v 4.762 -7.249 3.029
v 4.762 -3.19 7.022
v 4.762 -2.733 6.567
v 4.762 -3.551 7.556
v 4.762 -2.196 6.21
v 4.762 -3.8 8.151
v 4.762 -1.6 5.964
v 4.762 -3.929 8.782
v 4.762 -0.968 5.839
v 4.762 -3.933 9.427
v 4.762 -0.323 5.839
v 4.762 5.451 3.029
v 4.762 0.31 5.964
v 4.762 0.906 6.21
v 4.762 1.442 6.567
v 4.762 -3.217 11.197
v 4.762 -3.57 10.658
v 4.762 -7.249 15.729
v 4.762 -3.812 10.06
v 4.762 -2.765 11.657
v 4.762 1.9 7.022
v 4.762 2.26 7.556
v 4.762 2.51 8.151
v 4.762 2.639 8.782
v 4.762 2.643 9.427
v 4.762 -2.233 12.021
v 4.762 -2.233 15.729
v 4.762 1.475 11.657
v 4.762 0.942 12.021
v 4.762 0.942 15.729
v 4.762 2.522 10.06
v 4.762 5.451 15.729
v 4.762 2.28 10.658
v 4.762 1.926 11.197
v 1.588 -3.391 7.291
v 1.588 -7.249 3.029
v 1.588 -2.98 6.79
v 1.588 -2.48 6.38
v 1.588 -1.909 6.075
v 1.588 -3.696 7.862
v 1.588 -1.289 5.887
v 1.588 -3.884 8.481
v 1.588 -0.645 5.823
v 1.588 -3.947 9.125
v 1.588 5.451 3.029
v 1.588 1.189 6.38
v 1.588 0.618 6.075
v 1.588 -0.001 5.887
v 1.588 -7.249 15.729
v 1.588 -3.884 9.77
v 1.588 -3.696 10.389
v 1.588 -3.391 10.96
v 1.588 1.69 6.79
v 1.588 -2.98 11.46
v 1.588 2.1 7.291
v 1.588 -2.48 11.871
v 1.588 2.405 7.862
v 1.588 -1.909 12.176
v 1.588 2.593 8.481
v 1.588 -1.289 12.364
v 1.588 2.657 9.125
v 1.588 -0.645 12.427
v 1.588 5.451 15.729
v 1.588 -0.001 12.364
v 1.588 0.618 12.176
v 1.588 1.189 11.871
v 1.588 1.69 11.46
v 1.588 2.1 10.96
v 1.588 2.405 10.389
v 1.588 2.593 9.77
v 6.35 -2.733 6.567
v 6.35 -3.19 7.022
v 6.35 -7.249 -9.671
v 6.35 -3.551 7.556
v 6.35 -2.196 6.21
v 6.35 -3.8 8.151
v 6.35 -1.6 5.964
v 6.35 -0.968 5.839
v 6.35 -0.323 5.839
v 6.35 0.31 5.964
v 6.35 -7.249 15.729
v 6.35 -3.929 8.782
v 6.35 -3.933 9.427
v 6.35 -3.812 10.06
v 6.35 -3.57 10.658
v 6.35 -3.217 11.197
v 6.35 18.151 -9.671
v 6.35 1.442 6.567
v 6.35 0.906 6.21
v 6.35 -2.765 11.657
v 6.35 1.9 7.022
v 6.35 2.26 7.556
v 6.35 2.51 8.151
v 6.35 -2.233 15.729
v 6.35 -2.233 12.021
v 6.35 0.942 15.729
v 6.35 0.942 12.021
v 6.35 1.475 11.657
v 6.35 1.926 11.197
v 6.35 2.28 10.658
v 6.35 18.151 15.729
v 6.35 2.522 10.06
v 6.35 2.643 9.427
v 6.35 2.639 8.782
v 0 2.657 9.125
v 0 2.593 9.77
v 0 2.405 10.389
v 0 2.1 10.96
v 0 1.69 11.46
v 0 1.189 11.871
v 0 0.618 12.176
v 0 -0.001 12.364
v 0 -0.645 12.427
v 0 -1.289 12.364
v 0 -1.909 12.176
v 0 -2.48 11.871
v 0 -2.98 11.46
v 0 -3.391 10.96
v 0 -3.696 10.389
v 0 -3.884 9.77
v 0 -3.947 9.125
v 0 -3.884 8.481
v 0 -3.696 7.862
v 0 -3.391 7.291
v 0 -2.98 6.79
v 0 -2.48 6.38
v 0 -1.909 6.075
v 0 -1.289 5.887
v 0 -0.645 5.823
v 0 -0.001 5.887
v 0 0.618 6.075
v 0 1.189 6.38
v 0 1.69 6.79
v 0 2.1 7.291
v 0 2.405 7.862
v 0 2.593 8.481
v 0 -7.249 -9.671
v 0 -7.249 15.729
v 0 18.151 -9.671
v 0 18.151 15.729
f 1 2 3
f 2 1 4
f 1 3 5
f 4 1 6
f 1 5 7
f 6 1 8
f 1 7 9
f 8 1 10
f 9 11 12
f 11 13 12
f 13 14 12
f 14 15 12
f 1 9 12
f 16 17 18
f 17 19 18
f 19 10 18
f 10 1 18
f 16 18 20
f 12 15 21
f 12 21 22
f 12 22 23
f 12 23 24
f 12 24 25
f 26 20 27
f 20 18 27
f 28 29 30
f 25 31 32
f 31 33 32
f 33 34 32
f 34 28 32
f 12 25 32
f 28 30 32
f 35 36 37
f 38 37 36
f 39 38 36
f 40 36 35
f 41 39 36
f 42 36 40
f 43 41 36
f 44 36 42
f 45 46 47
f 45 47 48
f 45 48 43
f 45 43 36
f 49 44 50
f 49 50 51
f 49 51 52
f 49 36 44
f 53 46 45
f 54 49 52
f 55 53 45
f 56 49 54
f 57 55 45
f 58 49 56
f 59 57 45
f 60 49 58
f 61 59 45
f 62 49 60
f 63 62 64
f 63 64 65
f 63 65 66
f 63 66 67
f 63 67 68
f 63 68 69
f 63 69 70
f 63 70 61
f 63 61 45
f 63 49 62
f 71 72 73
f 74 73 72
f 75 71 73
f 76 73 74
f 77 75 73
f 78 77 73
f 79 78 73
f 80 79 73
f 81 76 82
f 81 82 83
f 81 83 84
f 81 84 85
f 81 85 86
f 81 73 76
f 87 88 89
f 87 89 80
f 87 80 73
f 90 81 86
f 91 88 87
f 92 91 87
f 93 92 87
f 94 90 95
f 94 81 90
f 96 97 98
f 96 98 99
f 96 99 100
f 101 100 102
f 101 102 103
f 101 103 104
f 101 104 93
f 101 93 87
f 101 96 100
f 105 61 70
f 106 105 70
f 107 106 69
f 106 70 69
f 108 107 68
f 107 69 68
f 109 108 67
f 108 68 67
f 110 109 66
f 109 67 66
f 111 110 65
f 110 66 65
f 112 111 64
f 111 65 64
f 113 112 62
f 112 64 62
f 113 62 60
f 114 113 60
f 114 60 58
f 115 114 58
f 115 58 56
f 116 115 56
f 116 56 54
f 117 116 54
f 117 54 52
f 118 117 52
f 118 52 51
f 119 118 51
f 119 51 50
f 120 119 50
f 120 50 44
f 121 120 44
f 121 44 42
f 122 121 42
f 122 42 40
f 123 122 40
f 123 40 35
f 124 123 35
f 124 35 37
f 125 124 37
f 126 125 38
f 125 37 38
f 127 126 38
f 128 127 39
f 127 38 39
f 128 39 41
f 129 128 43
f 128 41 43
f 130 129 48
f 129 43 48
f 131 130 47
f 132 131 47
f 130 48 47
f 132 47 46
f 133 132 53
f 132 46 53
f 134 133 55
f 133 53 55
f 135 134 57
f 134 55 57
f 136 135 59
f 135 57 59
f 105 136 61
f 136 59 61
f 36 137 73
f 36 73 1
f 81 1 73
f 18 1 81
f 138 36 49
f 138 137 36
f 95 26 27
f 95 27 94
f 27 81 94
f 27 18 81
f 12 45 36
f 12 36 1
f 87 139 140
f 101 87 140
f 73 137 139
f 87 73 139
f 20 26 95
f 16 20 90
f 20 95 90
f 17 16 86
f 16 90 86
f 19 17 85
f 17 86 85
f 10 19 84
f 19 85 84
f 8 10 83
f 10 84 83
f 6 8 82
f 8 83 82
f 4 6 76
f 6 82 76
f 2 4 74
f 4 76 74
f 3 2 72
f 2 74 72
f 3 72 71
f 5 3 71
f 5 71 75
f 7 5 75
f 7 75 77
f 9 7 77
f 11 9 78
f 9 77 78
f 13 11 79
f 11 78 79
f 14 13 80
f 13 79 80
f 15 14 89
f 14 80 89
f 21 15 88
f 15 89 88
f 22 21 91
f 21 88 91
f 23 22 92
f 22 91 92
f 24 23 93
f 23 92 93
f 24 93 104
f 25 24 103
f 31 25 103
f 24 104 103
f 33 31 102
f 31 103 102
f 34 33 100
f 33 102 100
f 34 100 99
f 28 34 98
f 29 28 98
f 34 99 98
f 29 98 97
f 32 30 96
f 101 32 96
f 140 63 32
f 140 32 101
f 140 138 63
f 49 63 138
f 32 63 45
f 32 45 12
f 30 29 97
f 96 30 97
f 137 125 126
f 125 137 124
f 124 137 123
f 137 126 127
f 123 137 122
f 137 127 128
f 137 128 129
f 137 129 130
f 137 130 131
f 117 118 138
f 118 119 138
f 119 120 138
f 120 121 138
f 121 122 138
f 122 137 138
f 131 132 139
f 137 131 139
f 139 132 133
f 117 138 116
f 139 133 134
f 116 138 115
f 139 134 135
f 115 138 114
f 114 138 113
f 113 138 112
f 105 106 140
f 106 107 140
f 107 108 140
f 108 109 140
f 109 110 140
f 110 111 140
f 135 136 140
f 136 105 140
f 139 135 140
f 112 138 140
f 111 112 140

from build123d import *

# Parameters (mm, degrees)
F0_W     = 25.4
F0_H     = 25.4
F1_DEPTH = 6.35
F2_R     = 3.302
F3_DEPTH = 25.4
F4_W     = 3.175
F4_H     = 12.7
F5_DEPTH = 12.7
F6_W     = 4.7625
F6_H     = 3.175
F7_DEPTH = 6.604


with BuildPart() as f1:
    # F0 (on Right) → F1 (new body)
    with BuildSketch(Plane.YZ):
        with Locations((5.450736, 3.029342)):
            Rectangle(F0_W, F0_H)
    extrude(amount=F1_DEPTH)

    # F2 (on face) → F3 (cut)
    with BuildSketch(Plane.YZ.offset(6.35)):
        with Locations((-0.645264, 9.125342)):
            Circle(F2_R)
    extrude(amount=-F3_DEPTH, mode=Mode.SUBTRACT)

    # F4 (on face) → F5 (cut)
    with BuildSketch(Plane.XY.offset(15.729342)):
        with Locations((3.175, -0.899264)):
            Rectangle(F4_W, F4_H)
    extrude(amount=-F5_DEPTH, mode=Mode.SUBTRACT)

    # F6 (on face) → F7 (cut)
    with BuildSketch(Plane.XY.offset(15.729342)):
        with Locations((3.96875, -0.645264)):
            Rectangle(F6_W, F6_H)
    extrude(amount=-F7_DEPTH, mode=Mode.SUBTRACT)


solid = f1.part
